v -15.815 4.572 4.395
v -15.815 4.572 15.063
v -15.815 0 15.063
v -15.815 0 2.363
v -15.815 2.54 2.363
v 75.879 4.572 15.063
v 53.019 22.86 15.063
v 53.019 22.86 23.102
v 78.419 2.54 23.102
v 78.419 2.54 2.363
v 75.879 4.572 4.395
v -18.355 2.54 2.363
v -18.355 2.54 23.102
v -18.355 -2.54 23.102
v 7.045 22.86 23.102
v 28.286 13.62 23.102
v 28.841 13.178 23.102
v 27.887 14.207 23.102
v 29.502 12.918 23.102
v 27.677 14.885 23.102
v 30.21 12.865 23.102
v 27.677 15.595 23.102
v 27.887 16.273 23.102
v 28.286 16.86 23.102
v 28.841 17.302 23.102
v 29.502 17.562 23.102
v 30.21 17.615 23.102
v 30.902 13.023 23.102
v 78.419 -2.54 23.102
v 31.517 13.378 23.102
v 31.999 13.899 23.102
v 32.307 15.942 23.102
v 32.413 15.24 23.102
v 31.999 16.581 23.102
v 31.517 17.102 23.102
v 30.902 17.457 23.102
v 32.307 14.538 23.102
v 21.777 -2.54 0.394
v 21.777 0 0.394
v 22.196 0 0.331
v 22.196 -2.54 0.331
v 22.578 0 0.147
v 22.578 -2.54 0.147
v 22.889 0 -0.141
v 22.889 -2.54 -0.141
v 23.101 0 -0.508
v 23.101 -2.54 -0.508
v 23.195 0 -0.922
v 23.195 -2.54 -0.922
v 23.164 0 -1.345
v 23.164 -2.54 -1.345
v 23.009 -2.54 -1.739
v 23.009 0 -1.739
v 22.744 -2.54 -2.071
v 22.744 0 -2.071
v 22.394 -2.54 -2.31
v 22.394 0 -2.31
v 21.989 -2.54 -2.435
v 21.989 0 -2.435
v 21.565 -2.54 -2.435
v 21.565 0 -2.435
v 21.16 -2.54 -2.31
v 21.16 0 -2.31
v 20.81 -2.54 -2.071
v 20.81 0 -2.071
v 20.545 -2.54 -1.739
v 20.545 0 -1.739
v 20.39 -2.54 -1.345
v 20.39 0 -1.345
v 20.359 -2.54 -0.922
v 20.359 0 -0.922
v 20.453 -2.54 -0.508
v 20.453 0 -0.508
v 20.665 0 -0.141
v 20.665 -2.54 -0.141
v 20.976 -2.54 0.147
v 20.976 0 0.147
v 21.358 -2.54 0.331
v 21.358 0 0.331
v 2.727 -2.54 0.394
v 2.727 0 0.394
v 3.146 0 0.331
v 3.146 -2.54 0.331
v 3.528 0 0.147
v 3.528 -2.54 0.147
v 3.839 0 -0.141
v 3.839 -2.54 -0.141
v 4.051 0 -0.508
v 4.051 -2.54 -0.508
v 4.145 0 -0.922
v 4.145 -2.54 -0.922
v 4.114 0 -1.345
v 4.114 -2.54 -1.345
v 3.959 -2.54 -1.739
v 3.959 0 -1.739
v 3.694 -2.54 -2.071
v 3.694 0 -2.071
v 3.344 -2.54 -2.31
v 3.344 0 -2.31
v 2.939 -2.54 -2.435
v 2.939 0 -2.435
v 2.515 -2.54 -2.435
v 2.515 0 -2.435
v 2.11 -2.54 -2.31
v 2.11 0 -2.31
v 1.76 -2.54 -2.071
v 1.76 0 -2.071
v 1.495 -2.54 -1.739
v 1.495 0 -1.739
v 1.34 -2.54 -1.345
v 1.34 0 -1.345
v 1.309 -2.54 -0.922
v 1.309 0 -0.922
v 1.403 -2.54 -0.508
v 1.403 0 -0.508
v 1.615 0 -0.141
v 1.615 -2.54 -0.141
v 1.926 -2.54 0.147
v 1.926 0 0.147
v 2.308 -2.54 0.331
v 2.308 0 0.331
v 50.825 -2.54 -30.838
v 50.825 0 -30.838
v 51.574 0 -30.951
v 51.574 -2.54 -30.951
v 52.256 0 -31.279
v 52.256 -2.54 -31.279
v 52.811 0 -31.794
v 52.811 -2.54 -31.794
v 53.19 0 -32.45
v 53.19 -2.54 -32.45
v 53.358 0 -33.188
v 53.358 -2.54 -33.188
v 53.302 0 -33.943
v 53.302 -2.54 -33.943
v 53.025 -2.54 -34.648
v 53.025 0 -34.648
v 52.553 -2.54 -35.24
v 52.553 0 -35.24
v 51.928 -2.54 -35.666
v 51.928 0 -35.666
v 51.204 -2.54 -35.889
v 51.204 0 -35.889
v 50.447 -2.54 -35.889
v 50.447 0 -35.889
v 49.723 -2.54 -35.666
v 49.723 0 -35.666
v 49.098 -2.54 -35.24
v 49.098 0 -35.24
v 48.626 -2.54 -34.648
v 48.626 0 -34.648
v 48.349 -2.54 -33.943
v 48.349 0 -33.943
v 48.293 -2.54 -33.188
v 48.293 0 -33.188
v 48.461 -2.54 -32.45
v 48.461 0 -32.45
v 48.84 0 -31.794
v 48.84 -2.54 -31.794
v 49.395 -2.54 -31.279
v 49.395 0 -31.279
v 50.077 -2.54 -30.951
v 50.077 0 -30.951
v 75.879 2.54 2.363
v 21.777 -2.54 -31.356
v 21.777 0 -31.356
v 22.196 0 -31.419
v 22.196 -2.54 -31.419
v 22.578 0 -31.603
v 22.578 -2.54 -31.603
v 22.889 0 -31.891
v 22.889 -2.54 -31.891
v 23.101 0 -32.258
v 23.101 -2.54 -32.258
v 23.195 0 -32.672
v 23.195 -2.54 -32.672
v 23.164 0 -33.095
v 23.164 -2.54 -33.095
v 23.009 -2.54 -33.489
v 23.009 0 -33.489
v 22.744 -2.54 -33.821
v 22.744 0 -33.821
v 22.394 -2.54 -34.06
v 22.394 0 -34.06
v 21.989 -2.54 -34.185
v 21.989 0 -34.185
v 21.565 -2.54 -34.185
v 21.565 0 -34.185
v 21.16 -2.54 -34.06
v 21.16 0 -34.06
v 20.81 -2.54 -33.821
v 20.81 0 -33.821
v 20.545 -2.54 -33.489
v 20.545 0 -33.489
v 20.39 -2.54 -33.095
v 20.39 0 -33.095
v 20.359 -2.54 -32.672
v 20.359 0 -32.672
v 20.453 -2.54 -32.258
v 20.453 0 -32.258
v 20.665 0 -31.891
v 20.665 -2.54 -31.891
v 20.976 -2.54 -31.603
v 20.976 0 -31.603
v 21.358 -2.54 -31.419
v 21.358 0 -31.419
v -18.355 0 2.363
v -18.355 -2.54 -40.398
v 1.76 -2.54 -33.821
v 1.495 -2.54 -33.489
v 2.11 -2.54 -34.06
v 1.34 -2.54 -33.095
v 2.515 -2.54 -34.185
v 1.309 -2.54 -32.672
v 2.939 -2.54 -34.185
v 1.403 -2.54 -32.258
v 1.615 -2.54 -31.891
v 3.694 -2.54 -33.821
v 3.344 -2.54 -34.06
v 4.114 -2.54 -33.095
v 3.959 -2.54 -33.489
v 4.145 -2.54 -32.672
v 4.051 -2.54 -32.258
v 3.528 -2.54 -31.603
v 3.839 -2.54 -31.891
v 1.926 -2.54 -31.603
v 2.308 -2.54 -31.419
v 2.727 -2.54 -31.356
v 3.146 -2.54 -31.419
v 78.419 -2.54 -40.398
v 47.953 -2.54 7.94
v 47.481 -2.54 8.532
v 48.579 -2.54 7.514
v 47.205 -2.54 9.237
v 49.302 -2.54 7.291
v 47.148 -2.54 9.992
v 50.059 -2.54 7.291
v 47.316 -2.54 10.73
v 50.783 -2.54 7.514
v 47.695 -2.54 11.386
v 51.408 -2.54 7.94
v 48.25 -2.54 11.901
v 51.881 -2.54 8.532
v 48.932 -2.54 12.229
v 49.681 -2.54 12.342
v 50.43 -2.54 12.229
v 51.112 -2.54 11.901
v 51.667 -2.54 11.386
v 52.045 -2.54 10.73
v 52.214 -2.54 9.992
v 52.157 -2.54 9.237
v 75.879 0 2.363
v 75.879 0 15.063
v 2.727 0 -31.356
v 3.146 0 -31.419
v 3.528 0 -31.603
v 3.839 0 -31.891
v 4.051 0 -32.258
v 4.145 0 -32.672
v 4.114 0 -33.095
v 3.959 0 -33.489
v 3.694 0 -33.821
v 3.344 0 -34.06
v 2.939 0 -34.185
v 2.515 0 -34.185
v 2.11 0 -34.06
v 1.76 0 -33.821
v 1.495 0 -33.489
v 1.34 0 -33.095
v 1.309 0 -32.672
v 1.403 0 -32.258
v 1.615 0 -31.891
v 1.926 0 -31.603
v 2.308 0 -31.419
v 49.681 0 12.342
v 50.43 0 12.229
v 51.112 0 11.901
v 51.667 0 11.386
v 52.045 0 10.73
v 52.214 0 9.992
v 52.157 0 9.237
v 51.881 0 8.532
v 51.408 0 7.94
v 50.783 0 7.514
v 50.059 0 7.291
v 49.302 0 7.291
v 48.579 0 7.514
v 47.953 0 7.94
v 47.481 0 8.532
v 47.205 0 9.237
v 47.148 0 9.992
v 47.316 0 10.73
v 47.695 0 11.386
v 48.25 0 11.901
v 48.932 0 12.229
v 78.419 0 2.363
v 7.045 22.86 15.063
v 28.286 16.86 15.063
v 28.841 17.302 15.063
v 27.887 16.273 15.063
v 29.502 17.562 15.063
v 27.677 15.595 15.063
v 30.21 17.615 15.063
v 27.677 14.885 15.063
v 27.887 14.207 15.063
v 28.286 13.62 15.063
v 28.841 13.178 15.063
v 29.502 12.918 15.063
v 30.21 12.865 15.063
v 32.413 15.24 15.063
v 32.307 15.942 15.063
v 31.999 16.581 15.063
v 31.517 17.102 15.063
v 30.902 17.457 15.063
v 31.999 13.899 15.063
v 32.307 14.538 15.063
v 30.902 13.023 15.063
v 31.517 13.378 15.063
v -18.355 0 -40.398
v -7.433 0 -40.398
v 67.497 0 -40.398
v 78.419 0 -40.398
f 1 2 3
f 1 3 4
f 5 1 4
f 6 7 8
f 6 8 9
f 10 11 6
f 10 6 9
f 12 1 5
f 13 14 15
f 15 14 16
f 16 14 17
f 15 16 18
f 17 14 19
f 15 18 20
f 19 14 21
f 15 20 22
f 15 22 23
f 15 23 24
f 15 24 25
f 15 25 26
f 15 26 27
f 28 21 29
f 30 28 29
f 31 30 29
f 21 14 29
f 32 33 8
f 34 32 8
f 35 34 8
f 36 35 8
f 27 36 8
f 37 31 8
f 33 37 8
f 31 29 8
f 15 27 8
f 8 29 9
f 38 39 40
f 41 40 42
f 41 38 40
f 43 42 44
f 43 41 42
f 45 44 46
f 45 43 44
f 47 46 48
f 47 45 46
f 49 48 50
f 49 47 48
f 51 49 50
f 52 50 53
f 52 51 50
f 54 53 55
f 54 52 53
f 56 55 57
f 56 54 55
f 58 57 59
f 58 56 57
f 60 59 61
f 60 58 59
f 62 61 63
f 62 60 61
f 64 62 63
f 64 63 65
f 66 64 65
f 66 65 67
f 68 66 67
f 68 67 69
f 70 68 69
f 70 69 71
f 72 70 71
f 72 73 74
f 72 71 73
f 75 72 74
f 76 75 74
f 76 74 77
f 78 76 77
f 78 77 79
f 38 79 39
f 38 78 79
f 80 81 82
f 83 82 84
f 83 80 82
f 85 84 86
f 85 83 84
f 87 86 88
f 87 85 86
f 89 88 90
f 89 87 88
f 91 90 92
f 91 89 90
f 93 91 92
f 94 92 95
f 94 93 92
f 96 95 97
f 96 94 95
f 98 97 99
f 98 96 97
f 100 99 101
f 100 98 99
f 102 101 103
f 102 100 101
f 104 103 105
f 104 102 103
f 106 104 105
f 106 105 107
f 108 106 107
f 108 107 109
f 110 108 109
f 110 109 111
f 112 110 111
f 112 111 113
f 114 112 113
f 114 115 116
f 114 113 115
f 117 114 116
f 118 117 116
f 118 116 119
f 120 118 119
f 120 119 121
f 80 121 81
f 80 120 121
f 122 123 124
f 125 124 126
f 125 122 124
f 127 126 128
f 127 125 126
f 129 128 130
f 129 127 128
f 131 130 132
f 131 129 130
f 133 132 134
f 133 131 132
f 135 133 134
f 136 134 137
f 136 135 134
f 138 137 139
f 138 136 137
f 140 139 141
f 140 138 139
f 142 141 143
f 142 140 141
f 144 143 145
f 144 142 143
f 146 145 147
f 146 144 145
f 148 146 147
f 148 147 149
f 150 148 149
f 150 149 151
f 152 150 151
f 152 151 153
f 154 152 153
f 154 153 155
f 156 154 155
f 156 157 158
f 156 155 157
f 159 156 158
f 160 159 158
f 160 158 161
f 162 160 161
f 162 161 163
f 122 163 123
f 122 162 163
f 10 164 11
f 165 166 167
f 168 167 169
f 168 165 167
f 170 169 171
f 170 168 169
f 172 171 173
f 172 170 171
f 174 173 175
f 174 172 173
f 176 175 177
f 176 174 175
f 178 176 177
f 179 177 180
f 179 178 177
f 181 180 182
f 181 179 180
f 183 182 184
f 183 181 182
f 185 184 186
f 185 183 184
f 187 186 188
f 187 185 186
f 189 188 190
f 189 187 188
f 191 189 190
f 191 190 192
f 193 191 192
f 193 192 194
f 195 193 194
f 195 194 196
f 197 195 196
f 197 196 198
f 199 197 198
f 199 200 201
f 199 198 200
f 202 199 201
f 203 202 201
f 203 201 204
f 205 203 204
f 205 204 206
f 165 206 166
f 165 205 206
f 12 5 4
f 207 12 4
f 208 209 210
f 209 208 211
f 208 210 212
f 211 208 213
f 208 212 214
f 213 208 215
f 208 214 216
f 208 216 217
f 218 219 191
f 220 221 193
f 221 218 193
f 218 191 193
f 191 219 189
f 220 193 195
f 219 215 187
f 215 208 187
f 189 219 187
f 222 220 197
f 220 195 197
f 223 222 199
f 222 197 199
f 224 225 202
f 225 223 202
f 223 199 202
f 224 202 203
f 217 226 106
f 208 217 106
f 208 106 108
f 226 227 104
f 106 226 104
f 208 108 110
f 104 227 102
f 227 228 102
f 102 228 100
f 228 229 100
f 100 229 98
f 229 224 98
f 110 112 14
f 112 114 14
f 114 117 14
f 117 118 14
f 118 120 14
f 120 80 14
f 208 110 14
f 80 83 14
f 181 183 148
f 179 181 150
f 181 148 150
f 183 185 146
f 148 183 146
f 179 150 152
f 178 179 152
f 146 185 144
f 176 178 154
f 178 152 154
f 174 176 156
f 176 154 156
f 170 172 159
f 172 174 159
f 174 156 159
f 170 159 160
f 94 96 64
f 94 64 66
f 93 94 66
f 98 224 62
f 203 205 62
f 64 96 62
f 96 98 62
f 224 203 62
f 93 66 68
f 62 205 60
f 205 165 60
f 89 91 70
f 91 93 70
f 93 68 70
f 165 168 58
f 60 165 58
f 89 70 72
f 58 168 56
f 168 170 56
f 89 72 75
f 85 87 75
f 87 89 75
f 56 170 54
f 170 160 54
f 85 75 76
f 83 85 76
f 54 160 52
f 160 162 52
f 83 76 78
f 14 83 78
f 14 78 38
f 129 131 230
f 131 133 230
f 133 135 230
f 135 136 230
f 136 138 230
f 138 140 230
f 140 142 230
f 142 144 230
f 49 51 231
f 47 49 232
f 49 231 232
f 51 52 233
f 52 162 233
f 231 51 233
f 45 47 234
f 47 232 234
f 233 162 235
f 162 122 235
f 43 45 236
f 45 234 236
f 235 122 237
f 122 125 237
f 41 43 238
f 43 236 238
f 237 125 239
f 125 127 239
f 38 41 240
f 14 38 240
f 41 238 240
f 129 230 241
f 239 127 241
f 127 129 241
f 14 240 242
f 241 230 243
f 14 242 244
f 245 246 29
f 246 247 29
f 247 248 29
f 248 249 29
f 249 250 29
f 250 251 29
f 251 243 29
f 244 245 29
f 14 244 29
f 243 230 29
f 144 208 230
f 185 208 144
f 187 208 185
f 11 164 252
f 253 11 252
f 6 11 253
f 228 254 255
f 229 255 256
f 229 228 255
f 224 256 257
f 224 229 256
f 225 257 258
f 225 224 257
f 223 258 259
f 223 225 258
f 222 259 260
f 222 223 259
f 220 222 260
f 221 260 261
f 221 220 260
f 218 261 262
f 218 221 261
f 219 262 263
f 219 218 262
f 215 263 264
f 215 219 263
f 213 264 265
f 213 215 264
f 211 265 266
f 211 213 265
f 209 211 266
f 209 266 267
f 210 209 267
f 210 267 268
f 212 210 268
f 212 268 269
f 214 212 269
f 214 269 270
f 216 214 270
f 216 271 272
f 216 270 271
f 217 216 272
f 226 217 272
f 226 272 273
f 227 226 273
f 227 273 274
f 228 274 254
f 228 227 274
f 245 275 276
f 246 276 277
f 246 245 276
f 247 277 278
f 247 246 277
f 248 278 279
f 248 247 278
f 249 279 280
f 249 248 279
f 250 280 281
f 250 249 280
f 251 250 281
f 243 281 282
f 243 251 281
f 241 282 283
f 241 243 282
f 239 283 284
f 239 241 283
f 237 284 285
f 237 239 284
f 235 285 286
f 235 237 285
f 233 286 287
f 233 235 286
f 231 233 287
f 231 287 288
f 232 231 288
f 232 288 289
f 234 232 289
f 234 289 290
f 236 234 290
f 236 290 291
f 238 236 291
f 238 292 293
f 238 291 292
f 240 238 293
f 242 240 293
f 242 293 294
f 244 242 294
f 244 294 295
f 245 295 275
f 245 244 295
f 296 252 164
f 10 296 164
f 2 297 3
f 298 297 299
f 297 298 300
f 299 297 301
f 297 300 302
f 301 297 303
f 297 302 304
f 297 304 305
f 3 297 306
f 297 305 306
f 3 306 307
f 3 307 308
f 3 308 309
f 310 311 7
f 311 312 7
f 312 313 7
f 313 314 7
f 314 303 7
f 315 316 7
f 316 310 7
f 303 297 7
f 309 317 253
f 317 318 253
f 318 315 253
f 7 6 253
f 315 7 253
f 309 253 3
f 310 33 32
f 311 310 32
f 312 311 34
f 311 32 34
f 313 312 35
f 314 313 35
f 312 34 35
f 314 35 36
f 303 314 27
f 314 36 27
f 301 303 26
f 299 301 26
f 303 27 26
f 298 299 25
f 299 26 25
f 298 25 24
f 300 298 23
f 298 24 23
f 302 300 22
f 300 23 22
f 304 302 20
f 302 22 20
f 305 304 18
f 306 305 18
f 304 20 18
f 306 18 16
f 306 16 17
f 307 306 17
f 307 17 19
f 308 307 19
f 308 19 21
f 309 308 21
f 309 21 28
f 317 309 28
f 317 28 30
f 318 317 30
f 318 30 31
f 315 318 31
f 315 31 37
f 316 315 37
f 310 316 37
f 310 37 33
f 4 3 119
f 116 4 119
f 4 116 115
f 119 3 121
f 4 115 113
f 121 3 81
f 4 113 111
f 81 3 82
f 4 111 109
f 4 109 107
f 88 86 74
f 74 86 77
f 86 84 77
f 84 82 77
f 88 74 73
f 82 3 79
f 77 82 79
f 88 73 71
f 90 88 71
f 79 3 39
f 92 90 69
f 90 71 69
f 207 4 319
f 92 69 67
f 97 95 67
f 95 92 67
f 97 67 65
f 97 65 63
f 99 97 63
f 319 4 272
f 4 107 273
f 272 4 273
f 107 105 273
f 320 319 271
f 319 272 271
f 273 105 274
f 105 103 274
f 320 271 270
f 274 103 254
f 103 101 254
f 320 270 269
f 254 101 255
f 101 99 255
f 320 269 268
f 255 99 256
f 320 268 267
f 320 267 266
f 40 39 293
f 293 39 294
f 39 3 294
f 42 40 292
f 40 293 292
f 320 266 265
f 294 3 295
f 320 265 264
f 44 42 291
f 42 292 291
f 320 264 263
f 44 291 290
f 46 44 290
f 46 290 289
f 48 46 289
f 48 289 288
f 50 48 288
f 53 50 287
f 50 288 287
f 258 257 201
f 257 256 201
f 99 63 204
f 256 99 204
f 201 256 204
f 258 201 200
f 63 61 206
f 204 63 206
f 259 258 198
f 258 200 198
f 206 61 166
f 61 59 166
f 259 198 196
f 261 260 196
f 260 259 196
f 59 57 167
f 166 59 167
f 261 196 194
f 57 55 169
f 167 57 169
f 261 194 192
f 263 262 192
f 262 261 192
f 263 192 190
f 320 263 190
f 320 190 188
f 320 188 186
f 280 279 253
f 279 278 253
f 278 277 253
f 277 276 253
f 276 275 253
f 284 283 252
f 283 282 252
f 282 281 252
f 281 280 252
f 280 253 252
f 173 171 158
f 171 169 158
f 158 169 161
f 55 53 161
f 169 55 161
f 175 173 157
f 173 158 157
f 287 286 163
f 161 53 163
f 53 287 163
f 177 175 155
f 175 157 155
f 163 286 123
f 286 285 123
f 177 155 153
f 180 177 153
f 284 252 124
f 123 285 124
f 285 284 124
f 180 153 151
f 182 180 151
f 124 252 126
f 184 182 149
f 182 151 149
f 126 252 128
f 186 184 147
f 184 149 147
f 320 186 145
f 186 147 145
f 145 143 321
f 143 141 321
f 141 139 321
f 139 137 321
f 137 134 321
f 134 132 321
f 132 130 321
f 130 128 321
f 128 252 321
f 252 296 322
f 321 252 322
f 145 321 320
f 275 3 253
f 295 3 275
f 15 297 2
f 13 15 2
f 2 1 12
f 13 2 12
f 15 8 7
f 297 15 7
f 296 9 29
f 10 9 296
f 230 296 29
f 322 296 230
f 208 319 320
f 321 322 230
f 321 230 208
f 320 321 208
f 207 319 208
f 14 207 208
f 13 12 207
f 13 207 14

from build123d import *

# Parameters (mm, degrees)
BOSS_EXTRUDE1_DEPTH      = 2.54
BOSS_EXTRUDE1_DEPTH_BACK = 2.54
SKETCH1_W                = 69.85
SKETCH1_H                = 63.5
SKETCH1_R                = 1.4224
SKETCH1_R_2              = 2.54
SKETCH2_W                = 69.85
SKETCH2_H                = 8.038671265
BOSS_EXTRUDE2_DEPTH      = 20.32
BOSS_EXTRUDE3_DEPTH      = 2.54
BOSS_EXTRUDE4_DEPTH      = 2.54
SKETCH5_W                = 42.761328735
SKETCH5_H                = 2.54
CUT_EXTRUDE1_DEPTH       = 89.142435188
SKETCH6_W                = 69.85
SKETCH6_H                = 2.54
BOSS_EXTRUDE5_DEPTH      = 12.7
SKETCH7_W                = 69.85
SKETCH7_H                = 2.54
CUT_EXTRUDE2_DEPTH       = 12.7
SKETCH8_R                = 2.38125
CUT_EXTRUDE3_DEPTH       = 96.449847624
BOSS_EXTRUDE6_DEPTH      = 10.922
BOSS_EXTRUDE7_DEPTH      = 10.922
CUT_EXTRUDE4_DEPTH       = 10.922
CUT_EXTRUDE5_DEPTH       = 10.922
CUT_EXTRUDE6_DEPTH       = 104.461914585
CUT_EXTRUDE6_DEPTH_BACK  = 104.461914585


with BuildPart() as part:
    # Sketch1 → Boss-Extrude1 (new, two sides: drawn at the far end of the back side and taken through both)
    with BuildSketch(Plane(origin=(0, 0, 0), x_dir=(1, 0, 0), z_dir=(0, 1, 0)).offset(-BOSS_EXTRUDE1_DEPTH_BACK)):
        with Locations((30.031991128, 8.648073975)):
            Rectangle(SKETCH1_W, SKETCH1_H)
        with Locations(Location((2.726991128, 32.778073975, 0), (0, 0, 270))):
            Circle(SKETCH1_R, mode=Mode.SUBTRACT)
        with Locations(Location((21.776991128, 32.778073975, 0), (0, 0, 270))):
            Circle(SKETCH1_R, mode=Mode.SUBTRACT)
        with Locations(Location((2.726991128, 1.028073975, 0), (0, 0, 270))):
            Circle(SKETCH1_R, mode=Mode.SUBTRACT)
        with Locations(Location((21.776991128, 1.028073975, 0), (0, 0, 270))):
            Circle(SKETCH1_R, mode=Mode.SUBTRACT)
        with Locations(Location((49.680840227, -9.802293314, 0), (0, 0, 270))):
            Circle(SKETCH1_R_2, mode=Mode.SUBTRACT)
        with Locations(Location((50.825492869, 33.377706686, 0), (0, 0, 270))):
            Circle(SKETCH1_R_2, mode=Mode.SUBTRACT)
    extrude(amount=BOSS_EXTRUDE1_DEPTH + BOSS_EXTRUDE1_DEPTH_BACK)

    # Sketch2 → Boss-Extrude2 (add)
    with BuildSketch(Plane(origin=(0, 2.54, 0), x_dir=(1, 0, 0), z_dir=(0, 1, 0))):
        with Locations((30.031991128, -19.082590393)):
            Rectangle(SKETCH2_W, SKETCH2_H)
    extrude(amount=BOSS_EXTRUDE2_DEPTH)

    # Sketch3 → Boss-Extrude3 (add)
    with BuildSketch(Plane.ZY.offset(4.893008872)):
        Polygon((15.06325476, 15.24), (2.36325476, 2.54), (-40.398073975, 2.54), (-40.398073975, -2.54), (23.101926025, -2.54), (23.101926025, 22.86), (15.06325476, 22.86), align=None)
    extrude(amount=BOSS_EXTRUDE3_DEPTH)

    # Sketch4 → Boss-Extrude4 (add)
    with BuildSketch(Plane(origin=(64.956991128, 0, 0), x_dir=(0, 0, -1), z_dir=(1, 0, 0))):
        Polygon((-15.06325476, 15.24), (-2.36325476, 2.54), (40.398073975, 2.54), (40.398073975, -2.54), (-23.101926025, -2.54), (-23.101926025, 22.86), (-15.06325476, 22.86), align=None)
    extrude(amount=BOSS_EXTRUDE4_DEPTH)

    # Sketch5 → Cut-Extrude1 (cut, through all)
    with BuildSketch(Plane.ZY.offset(7.433008872)):
        with Locations((-19.017409607, 1.27)):
            Rectangle(SKETCH5_W, SKETCH5_H)
    extrude(amount=-CUT_EXTRUDE1_DEPTH, mode=Mode.SUBTRACT)

    # Sketch6 → Boss-Extrude5 (add)
    with BuildSketch(Plane(origin=(0, 0, 2.36325476), x_dir=(-1, 0, 0), z_dir=(0, 0, -1))):
        with Locations((-30.031991128, 1.27)):
            Rectangle(SKETCH6_W, SKETCH6_H)
    extrude(amount=-BOSS_EXTRUDE5_DEPTH)

    # Sketch7 → Cut-Extrude2 (cut)
    with BuildSketch(Plane(origin=(0, 0, 2.36325476), x_dir=(-1, 0, 0), z_dir=(0, 0, -1))):
        with Locations((-30.031991128, 1.27)):
            Rectangle(SKETCH7_W, SKETCH7_H)
    extrude(amount=-CUT_EXTRUDE2_DEPTH, mode=Mode.SUBTRACT)

    # Sketch8 → Cut-Extrude3 (cut, through all)
    with BuildSketch(Plane.XY.offset(23.101926025)):
        with Locations((30.031991128, 15.24)):
            Circle(SKETCH8_R)
    extrude(amount=-CUT_EXTRUDE3_DEPTH, mode=Mode.SUBTRACT)

    # Sketch9 → Boss-Extrude6 (add)
    with BuildSketch(Plane(origin=(67.496991128, 0, 0), x_dir=(0, 0, -1), z_dir=(1, 0, 0))):
        Polygon((-2.36325476, 0), (-2.36325476, 2.54), (-15.06325476, 15.24), (-15.06325476, 22.86), (-23.101926025, 22.86), (-23.101926025, -2.54), (40.398073975, -2.54), (40.398073975, 0), align=None)
    extrude(amount=BOSS_EXTRUDE6_DEPTH)

    # Sketch10 → Boss-Extrude7 (add)
    with BuildSketch(Plane.ZY.offset(7.433008872)):
        Polygon((2.36325476, 2.54), (2.36325476, 0), (-40.398073975, 0), (-40.398073975, -2.54), (23.101926025, -2.54), (23.101926025, 22.86), (15.06325476, 22.86), (15.06325476, 15.24), align=None)
    extrude(amount=BOSS_EXTRUDE7_DEPTH)

    # Sketch12 → Cut-Extrude4 (cut)
    with BuildSketch(Plane.ZY.offset(-64.956991128)):
        Polygon((15.06325476, 15.24), (2.36325476, 2.54), (2.36325476, 0), (15.06325476, 0), align=None)
    extrude(amount=-CUT_EXTRUDE4_DEPTH, mode=Mode.SUBTRACT)

    # Sketch13 → Cut-Extrude5 (cut)
    with BuildSketch(Plane(origin=(-4.893008872, 0, 0), x_dir=(0, 0, -1), z_dir=(1, 0, 0))):
        Polygon((-2.36325476, 2.54), (-15.06325476, 15.24), (-15.06325476, 0), (-2.36325476, 0), align=None)
    extrude(amount=-CUT_EXTRUDE5_DEPTH, mode=Mode.SUBTRACT)

    # Sketch14 → Cut-Extrude6 (cut, two sides: drawn at the far end of the back side and taken through both)
    with BuildSketch(Plane.XY.offset(23.101926025).offset(-CUT_EXTRUDE6_DEPTH_BACK)):
        Polygon((78.418991128, 22.86), (53.018991128, 22.86), (78.418991128, 2.54), align=None)
        Polygon((-18.355008872, 22.86), (7.044991128, 22.86), (-18.355008872, 2.54), align=None)
    extrude(amount=CUT_EXTRUDE6_DEPTH + CUT_EXTRUDE6_DEPTH_BACK, mode=Mode.SUBTRACT)


solid = part.part
